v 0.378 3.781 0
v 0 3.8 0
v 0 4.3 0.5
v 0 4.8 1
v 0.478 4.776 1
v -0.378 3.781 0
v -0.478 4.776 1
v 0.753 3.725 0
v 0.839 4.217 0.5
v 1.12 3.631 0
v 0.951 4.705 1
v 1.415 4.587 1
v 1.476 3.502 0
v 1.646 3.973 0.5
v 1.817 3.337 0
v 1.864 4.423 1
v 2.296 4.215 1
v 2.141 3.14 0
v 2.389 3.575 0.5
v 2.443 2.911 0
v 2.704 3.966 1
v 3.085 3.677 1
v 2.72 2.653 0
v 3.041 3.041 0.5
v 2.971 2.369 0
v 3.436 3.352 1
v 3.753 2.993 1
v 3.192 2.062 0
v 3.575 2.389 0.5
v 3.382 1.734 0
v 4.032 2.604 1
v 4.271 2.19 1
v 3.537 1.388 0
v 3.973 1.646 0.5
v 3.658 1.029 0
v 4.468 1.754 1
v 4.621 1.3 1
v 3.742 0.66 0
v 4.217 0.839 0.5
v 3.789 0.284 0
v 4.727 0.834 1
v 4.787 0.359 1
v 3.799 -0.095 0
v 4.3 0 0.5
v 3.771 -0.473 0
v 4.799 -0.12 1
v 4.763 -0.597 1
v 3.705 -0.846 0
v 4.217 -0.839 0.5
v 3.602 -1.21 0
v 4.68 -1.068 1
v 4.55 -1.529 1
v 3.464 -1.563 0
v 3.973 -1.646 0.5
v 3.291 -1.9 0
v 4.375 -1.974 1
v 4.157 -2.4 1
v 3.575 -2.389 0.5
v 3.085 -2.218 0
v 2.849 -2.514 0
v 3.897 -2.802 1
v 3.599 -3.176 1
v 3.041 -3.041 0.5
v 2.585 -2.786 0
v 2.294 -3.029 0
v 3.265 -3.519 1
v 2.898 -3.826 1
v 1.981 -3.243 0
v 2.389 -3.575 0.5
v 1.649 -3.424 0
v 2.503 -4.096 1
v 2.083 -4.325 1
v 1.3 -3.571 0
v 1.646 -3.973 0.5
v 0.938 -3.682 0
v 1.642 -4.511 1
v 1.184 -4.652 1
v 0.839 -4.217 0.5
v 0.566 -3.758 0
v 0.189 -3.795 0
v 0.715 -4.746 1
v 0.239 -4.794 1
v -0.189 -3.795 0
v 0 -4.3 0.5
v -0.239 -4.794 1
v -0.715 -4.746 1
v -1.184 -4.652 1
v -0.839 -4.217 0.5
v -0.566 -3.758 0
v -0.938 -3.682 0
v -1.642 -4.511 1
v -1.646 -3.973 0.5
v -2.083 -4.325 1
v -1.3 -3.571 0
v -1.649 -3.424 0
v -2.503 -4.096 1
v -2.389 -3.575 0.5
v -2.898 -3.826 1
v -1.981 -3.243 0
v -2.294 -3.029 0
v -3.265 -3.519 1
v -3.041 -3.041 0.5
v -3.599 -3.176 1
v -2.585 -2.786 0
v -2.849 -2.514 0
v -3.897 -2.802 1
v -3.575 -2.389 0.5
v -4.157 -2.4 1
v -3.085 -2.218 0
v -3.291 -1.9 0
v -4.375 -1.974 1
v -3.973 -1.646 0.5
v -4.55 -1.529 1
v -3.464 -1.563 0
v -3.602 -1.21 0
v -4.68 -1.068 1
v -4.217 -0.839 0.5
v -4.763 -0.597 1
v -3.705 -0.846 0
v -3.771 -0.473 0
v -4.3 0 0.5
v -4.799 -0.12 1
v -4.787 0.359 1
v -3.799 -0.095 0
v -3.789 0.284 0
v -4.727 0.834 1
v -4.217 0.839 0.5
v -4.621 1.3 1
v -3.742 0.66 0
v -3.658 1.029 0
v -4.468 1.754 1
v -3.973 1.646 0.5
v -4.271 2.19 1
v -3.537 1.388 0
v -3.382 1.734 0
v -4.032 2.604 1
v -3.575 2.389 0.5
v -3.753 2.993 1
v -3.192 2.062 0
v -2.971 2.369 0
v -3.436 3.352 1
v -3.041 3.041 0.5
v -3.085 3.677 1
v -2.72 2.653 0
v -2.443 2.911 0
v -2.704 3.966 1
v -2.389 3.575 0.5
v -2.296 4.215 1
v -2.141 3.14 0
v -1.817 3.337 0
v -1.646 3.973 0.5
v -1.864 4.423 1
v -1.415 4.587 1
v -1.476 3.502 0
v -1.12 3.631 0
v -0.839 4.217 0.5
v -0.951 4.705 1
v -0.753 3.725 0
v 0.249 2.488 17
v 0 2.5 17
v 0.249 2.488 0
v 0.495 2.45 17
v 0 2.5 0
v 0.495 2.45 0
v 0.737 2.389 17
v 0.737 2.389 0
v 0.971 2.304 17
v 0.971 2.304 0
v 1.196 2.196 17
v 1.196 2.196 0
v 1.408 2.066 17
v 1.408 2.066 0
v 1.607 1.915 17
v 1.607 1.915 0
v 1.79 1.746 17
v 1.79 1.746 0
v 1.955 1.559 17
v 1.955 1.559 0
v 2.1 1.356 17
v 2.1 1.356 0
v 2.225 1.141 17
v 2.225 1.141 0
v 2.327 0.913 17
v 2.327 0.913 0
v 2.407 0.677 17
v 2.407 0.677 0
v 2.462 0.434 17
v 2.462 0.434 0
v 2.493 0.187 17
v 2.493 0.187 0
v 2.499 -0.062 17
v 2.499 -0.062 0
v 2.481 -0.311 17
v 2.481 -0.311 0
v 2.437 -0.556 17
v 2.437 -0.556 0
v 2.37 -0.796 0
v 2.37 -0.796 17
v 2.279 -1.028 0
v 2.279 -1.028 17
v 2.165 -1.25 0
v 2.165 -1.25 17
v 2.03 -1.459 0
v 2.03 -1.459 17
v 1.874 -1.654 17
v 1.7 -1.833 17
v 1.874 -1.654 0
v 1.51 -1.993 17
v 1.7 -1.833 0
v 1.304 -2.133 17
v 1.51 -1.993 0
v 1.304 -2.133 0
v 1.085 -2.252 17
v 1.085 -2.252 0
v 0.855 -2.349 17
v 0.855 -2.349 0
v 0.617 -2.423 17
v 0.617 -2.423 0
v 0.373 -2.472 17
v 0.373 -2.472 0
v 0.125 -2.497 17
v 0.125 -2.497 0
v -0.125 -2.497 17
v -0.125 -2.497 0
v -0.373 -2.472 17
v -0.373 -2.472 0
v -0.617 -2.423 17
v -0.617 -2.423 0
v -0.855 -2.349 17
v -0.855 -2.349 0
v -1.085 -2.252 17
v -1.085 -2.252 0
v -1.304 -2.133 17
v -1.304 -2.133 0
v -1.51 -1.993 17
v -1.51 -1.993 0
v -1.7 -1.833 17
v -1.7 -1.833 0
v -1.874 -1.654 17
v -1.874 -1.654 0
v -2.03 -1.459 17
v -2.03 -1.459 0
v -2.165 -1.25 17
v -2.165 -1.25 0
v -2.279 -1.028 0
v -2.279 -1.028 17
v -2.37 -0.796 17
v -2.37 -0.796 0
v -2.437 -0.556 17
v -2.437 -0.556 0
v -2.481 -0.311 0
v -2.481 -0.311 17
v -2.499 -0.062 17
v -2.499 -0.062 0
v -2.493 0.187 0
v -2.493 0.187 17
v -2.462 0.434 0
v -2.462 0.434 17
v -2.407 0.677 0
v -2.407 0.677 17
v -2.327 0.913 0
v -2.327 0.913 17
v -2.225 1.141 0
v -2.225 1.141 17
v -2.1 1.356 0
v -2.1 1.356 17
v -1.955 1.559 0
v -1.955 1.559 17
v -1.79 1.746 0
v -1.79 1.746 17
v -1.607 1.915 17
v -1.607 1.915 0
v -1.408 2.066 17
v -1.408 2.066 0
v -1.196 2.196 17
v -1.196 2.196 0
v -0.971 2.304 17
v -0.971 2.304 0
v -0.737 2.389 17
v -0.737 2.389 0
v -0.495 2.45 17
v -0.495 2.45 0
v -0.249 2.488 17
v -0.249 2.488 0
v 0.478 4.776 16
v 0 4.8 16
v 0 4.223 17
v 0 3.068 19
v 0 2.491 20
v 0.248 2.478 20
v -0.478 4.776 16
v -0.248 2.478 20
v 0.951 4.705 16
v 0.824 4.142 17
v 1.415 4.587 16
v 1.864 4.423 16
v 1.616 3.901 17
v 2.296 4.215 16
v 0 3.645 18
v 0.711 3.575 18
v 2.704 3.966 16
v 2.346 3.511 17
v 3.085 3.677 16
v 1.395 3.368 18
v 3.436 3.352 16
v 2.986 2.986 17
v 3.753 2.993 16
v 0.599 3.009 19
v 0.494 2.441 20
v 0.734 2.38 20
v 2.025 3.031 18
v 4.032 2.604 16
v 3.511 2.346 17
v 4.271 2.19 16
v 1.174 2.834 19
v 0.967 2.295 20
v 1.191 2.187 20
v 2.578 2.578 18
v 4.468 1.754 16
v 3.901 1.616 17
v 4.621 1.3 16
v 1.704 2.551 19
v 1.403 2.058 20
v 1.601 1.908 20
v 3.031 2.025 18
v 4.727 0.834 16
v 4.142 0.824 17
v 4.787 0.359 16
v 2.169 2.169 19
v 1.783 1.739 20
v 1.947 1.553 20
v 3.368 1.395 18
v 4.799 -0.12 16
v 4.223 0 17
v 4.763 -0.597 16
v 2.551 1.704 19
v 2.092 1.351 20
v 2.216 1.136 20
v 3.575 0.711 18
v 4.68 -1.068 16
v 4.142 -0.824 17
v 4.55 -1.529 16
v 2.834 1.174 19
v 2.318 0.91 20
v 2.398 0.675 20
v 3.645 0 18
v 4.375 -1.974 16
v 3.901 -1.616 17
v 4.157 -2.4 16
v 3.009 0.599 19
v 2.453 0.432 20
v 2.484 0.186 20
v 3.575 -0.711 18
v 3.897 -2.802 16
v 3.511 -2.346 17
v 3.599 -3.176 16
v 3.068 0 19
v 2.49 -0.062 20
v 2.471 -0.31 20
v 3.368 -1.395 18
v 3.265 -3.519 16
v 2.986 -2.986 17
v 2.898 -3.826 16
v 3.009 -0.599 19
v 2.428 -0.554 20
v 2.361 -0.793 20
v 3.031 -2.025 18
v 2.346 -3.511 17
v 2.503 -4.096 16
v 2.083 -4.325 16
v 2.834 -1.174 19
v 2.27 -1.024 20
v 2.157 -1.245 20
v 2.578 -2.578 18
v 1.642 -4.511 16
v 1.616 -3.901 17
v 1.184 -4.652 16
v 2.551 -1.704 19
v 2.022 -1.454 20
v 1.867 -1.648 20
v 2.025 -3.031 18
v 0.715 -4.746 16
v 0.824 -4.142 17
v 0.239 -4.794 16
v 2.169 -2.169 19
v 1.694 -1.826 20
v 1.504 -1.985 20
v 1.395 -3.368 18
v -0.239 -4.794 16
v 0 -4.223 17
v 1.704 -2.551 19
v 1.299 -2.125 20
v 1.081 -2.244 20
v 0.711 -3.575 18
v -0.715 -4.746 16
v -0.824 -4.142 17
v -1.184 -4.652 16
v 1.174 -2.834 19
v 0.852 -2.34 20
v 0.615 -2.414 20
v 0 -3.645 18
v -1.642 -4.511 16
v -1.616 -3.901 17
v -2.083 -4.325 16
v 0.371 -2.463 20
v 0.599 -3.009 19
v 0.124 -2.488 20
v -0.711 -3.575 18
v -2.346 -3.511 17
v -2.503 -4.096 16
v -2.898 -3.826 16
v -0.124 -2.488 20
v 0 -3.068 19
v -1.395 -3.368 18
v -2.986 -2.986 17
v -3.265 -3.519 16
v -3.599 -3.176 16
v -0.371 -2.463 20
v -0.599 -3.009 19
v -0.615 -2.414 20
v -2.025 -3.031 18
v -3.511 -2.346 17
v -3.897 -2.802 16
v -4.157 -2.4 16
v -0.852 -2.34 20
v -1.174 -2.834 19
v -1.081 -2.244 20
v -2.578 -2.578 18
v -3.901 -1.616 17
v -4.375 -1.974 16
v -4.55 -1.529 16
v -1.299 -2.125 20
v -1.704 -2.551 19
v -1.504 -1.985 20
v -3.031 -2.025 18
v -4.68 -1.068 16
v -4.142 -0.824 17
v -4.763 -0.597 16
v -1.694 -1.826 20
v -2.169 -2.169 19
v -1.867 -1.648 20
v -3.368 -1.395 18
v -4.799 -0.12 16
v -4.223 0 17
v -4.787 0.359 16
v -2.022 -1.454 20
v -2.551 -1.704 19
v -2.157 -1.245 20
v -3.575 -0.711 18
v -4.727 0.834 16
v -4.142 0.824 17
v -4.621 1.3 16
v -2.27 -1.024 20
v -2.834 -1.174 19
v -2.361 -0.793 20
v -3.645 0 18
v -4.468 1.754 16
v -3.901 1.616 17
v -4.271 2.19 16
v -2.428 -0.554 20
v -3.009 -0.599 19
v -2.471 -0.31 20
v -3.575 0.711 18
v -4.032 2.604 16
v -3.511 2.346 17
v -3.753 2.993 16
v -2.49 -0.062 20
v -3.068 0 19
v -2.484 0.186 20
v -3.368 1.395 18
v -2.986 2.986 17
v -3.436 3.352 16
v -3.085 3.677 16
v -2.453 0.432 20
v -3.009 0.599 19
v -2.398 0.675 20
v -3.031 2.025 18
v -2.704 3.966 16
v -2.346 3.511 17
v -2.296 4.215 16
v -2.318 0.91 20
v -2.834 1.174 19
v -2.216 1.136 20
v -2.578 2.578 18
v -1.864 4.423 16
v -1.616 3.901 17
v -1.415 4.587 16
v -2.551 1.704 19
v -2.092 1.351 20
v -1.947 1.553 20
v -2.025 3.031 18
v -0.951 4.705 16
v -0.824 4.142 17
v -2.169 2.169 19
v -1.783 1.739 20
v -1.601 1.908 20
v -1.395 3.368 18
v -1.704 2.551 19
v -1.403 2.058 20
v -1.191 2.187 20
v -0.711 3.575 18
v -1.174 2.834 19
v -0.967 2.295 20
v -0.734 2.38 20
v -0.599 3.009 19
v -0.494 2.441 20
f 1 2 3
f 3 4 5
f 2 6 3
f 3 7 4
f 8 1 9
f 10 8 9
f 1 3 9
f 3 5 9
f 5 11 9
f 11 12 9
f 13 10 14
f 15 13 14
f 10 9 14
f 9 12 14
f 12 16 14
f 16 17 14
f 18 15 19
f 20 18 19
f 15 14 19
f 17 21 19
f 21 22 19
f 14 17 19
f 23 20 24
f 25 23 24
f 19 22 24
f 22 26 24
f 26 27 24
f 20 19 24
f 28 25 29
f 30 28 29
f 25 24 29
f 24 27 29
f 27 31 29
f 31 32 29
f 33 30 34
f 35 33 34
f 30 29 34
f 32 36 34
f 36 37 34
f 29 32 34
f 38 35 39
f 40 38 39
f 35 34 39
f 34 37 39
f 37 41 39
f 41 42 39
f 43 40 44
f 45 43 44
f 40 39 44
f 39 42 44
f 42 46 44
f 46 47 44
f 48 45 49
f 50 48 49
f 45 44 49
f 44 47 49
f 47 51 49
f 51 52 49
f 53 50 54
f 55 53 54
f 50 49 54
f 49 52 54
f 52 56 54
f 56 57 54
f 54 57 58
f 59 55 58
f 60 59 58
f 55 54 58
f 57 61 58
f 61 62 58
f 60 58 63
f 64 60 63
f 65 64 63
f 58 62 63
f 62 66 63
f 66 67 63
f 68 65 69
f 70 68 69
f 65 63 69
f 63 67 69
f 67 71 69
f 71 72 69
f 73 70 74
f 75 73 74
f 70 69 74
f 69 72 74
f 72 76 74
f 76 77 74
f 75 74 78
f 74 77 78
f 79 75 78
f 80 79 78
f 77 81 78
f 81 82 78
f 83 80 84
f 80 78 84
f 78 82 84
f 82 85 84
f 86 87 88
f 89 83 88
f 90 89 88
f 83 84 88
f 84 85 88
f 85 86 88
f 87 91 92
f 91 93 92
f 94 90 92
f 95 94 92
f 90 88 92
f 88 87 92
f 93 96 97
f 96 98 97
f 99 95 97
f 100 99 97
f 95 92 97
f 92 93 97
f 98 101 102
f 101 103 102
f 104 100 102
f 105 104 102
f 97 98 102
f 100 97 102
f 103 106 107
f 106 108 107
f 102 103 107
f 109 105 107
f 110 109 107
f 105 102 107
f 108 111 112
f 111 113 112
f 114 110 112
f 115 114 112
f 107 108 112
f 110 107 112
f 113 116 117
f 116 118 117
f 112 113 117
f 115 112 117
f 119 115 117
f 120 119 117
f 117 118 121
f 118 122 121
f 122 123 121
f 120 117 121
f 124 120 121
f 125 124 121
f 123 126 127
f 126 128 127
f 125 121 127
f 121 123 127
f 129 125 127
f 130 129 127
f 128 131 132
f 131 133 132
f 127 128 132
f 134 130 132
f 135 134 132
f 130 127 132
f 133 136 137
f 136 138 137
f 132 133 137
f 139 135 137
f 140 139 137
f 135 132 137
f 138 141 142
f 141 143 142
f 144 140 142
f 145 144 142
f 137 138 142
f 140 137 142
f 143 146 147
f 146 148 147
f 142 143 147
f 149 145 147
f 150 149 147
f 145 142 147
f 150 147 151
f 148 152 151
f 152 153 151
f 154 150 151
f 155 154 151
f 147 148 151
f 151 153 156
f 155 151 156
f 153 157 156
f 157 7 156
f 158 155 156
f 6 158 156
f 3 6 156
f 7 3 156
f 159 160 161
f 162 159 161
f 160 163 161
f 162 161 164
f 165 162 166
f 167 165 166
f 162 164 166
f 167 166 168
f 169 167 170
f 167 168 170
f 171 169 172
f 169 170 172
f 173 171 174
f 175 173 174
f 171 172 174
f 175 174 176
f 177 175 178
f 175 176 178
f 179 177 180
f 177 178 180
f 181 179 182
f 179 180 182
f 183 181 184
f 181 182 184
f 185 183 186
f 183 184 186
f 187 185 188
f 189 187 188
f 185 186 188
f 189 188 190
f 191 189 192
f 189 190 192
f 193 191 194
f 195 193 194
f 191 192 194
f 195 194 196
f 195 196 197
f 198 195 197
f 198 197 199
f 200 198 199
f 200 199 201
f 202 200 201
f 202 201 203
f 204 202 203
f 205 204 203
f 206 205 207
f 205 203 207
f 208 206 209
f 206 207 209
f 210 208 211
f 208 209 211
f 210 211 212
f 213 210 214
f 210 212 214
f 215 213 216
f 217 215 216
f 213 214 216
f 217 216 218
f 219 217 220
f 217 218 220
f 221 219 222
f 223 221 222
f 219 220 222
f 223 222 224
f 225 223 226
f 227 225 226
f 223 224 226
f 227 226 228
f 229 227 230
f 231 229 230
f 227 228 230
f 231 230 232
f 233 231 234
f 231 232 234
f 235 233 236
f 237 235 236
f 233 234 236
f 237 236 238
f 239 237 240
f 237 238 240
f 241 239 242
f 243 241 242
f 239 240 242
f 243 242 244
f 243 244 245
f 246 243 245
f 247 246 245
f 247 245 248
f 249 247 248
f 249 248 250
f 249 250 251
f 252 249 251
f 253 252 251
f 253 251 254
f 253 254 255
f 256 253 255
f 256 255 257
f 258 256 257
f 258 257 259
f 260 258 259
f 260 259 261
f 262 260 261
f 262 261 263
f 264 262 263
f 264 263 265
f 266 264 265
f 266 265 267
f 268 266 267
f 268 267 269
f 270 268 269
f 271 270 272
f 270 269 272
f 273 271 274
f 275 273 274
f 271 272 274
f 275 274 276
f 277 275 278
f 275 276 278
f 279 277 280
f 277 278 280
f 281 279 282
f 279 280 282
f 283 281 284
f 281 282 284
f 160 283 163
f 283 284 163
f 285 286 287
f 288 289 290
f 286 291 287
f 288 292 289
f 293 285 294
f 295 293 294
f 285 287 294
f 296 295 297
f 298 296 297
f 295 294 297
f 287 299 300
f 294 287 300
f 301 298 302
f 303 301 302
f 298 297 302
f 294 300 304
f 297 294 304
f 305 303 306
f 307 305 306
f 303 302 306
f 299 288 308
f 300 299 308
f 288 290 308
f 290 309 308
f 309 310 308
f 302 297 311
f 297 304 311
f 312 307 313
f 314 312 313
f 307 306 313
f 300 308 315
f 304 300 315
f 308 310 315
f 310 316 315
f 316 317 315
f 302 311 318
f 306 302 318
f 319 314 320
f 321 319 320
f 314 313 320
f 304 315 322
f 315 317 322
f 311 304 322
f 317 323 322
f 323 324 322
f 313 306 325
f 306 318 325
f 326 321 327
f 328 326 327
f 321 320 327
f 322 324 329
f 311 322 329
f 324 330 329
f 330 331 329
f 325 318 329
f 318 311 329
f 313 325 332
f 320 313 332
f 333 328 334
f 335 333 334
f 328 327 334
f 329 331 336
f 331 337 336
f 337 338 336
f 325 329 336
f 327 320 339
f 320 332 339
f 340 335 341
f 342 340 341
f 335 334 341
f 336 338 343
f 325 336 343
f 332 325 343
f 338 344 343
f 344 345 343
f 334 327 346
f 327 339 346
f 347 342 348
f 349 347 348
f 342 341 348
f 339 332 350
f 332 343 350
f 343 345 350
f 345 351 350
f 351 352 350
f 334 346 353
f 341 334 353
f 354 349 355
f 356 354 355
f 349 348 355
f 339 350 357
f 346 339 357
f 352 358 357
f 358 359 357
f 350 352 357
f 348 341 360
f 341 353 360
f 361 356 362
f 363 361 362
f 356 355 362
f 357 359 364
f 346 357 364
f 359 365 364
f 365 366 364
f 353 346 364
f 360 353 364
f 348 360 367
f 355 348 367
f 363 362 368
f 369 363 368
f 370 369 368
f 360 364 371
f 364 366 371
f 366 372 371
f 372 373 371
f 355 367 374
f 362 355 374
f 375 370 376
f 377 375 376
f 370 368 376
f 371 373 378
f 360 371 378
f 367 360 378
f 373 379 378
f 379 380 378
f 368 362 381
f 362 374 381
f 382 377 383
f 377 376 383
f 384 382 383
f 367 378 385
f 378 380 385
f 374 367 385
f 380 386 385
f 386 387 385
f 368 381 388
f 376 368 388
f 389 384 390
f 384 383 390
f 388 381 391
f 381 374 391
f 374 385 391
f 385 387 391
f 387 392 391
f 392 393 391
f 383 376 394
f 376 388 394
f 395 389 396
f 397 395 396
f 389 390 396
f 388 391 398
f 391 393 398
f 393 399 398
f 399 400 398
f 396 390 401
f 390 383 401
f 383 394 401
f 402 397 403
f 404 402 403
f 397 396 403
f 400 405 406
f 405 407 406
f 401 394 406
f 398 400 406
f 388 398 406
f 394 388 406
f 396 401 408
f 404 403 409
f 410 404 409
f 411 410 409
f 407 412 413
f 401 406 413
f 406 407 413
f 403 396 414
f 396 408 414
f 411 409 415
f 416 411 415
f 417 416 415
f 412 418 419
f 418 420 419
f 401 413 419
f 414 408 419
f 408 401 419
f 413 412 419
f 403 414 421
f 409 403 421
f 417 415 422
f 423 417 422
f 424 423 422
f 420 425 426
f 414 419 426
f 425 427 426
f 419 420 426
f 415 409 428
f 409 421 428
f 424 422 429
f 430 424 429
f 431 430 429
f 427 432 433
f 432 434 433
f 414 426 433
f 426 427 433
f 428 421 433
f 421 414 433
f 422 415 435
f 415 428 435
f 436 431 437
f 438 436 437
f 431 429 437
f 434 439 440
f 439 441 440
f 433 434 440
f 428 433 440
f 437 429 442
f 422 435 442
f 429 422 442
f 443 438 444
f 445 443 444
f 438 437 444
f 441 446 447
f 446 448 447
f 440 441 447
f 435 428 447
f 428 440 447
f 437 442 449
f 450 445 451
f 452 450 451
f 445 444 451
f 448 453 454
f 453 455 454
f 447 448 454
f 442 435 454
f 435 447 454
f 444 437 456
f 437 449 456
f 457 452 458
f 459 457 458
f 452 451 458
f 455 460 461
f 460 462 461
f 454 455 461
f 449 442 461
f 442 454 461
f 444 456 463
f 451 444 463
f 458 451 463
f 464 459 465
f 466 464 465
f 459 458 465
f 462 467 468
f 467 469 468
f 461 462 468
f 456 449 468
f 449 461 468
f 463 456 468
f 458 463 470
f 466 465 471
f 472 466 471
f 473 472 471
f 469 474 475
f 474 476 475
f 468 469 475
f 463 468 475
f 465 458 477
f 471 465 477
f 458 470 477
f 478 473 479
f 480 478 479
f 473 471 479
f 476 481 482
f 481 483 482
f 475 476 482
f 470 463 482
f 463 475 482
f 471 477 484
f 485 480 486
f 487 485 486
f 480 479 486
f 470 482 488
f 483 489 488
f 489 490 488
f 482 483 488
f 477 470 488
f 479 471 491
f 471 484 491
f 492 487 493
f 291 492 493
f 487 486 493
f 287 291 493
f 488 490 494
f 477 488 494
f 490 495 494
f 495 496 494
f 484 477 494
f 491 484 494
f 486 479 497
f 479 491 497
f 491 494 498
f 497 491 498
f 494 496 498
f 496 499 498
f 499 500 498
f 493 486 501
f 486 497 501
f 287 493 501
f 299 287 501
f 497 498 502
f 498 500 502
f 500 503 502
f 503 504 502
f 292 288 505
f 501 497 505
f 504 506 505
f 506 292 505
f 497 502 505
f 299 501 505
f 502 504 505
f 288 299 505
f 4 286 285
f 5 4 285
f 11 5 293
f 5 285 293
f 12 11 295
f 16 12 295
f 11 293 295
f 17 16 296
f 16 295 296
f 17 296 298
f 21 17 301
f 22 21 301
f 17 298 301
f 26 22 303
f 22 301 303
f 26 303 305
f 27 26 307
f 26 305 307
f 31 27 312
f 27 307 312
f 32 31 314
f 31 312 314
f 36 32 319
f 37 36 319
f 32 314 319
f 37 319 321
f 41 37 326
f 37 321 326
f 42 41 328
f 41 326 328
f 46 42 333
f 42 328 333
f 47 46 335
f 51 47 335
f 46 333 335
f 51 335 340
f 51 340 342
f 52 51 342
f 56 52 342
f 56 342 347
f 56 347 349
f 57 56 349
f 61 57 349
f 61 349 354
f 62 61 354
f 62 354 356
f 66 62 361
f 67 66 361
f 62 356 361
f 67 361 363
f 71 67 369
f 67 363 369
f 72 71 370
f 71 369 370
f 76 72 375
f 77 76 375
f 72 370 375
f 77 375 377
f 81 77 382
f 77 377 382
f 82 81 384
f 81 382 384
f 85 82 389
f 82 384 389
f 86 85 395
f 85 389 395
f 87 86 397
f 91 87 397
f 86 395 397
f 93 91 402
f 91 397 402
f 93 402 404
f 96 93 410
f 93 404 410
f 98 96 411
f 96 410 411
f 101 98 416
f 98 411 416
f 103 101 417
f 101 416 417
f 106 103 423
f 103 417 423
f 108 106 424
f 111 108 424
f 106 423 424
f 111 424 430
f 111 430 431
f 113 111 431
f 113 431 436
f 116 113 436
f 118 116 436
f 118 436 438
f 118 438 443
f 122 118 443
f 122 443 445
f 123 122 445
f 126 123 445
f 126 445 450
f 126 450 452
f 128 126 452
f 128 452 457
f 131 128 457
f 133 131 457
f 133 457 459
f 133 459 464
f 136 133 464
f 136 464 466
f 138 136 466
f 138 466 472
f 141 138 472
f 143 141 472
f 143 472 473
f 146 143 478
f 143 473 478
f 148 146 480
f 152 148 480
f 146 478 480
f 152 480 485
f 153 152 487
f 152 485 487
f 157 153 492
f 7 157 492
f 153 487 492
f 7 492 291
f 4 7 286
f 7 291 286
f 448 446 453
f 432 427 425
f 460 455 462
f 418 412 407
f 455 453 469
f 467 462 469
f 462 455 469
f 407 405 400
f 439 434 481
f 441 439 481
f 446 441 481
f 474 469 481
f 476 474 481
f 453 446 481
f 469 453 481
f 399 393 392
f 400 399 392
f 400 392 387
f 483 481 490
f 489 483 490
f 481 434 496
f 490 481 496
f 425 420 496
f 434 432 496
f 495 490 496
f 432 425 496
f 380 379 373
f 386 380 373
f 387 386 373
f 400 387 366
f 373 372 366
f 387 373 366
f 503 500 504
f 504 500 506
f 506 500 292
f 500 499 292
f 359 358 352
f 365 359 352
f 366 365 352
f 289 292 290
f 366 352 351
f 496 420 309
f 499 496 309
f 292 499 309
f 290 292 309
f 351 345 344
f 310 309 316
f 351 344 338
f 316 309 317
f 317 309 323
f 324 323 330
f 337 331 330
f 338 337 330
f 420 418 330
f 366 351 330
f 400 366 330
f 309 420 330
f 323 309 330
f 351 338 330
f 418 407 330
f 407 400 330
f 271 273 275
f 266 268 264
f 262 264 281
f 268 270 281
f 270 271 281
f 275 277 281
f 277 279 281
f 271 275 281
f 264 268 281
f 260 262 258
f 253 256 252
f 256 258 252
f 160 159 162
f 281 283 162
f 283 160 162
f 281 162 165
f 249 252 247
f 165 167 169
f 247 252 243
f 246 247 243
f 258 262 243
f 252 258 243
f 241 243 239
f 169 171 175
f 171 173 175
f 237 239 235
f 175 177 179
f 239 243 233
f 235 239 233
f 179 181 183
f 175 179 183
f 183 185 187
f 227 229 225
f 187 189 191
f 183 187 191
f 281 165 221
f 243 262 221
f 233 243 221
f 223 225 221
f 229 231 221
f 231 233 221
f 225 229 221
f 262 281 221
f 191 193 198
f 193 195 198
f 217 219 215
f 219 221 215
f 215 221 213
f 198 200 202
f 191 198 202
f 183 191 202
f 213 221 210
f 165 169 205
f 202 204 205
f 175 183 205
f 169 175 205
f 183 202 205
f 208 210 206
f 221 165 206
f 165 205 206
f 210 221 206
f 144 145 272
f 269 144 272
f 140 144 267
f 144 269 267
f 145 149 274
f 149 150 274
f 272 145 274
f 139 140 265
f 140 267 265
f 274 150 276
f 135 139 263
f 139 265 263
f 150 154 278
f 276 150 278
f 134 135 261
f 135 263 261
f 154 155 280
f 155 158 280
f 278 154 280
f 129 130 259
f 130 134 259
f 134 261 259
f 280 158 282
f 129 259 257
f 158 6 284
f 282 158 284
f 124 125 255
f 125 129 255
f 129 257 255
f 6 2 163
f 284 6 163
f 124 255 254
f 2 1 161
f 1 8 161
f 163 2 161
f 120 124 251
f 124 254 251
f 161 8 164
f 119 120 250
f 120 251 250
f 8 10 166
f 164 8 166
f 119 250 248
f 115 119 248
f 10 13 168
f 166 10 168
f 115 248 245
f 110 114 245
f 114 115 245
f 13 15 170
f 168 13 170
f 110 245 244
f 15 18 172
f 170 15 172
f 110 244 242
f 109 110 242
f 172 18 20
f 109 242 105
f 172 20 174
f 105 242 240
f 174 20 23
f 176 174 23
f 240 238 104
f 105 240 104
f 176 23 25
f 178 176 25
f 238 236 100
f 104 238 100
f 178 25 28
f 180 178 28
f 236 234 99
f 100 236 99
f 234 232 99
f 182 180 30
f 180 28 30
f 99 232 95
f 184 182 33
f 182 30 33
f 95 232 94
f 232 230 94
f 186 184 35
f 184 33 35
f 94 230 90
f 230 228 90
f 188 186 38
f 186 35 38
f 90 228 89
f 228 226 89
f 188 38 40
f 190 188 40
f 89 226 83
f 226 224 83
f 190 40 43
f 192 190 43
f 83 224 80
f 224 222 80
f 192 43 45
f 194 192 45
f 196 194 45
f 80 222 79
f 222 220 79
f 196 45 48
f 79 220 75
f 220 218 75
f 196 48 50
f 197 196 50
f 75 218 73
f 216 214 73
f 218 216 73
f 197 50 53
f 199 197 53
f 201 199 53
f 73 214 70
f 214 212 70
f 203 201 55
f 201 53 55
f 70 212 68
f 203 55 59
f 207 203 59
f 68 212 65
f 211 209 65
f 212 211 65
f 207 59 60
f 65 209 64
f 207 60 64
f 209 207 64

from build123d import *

# Parameters (mm, degrees)
F2_SIZE  = 1
F3_SIZE2 = 2.309401
F3_SIZE  = 4


with BuildPart() as f1:
    # F0 (on Right) → F1 (revolve)
    with BuildSketch(Plane.YZ):
        Polygon((2.5, 17), (2.5, 0), (4.8, 0), (4.8, 20), (0, 20), (0, 17), align=None)
    revolve(axis=Axis((0, 0, 15.318091), (0, 0, -1)))

    # F2
    f2_edges = [f1.edges().sort_by_distance(p)[0] for p in [
        (0, -4.8, 0),
    ]]
    chamfer(f2_edges, length=F2_SIZE)

    # F3
    f3_edges = [f1.edges().sort_by_distance(p)[0] for p in [
        (0, -4.8, 20),
    ]]
    chamfer(f3_edges, length=F3_SIZE, length2=F3_SIZE2)


solid = f1.part
